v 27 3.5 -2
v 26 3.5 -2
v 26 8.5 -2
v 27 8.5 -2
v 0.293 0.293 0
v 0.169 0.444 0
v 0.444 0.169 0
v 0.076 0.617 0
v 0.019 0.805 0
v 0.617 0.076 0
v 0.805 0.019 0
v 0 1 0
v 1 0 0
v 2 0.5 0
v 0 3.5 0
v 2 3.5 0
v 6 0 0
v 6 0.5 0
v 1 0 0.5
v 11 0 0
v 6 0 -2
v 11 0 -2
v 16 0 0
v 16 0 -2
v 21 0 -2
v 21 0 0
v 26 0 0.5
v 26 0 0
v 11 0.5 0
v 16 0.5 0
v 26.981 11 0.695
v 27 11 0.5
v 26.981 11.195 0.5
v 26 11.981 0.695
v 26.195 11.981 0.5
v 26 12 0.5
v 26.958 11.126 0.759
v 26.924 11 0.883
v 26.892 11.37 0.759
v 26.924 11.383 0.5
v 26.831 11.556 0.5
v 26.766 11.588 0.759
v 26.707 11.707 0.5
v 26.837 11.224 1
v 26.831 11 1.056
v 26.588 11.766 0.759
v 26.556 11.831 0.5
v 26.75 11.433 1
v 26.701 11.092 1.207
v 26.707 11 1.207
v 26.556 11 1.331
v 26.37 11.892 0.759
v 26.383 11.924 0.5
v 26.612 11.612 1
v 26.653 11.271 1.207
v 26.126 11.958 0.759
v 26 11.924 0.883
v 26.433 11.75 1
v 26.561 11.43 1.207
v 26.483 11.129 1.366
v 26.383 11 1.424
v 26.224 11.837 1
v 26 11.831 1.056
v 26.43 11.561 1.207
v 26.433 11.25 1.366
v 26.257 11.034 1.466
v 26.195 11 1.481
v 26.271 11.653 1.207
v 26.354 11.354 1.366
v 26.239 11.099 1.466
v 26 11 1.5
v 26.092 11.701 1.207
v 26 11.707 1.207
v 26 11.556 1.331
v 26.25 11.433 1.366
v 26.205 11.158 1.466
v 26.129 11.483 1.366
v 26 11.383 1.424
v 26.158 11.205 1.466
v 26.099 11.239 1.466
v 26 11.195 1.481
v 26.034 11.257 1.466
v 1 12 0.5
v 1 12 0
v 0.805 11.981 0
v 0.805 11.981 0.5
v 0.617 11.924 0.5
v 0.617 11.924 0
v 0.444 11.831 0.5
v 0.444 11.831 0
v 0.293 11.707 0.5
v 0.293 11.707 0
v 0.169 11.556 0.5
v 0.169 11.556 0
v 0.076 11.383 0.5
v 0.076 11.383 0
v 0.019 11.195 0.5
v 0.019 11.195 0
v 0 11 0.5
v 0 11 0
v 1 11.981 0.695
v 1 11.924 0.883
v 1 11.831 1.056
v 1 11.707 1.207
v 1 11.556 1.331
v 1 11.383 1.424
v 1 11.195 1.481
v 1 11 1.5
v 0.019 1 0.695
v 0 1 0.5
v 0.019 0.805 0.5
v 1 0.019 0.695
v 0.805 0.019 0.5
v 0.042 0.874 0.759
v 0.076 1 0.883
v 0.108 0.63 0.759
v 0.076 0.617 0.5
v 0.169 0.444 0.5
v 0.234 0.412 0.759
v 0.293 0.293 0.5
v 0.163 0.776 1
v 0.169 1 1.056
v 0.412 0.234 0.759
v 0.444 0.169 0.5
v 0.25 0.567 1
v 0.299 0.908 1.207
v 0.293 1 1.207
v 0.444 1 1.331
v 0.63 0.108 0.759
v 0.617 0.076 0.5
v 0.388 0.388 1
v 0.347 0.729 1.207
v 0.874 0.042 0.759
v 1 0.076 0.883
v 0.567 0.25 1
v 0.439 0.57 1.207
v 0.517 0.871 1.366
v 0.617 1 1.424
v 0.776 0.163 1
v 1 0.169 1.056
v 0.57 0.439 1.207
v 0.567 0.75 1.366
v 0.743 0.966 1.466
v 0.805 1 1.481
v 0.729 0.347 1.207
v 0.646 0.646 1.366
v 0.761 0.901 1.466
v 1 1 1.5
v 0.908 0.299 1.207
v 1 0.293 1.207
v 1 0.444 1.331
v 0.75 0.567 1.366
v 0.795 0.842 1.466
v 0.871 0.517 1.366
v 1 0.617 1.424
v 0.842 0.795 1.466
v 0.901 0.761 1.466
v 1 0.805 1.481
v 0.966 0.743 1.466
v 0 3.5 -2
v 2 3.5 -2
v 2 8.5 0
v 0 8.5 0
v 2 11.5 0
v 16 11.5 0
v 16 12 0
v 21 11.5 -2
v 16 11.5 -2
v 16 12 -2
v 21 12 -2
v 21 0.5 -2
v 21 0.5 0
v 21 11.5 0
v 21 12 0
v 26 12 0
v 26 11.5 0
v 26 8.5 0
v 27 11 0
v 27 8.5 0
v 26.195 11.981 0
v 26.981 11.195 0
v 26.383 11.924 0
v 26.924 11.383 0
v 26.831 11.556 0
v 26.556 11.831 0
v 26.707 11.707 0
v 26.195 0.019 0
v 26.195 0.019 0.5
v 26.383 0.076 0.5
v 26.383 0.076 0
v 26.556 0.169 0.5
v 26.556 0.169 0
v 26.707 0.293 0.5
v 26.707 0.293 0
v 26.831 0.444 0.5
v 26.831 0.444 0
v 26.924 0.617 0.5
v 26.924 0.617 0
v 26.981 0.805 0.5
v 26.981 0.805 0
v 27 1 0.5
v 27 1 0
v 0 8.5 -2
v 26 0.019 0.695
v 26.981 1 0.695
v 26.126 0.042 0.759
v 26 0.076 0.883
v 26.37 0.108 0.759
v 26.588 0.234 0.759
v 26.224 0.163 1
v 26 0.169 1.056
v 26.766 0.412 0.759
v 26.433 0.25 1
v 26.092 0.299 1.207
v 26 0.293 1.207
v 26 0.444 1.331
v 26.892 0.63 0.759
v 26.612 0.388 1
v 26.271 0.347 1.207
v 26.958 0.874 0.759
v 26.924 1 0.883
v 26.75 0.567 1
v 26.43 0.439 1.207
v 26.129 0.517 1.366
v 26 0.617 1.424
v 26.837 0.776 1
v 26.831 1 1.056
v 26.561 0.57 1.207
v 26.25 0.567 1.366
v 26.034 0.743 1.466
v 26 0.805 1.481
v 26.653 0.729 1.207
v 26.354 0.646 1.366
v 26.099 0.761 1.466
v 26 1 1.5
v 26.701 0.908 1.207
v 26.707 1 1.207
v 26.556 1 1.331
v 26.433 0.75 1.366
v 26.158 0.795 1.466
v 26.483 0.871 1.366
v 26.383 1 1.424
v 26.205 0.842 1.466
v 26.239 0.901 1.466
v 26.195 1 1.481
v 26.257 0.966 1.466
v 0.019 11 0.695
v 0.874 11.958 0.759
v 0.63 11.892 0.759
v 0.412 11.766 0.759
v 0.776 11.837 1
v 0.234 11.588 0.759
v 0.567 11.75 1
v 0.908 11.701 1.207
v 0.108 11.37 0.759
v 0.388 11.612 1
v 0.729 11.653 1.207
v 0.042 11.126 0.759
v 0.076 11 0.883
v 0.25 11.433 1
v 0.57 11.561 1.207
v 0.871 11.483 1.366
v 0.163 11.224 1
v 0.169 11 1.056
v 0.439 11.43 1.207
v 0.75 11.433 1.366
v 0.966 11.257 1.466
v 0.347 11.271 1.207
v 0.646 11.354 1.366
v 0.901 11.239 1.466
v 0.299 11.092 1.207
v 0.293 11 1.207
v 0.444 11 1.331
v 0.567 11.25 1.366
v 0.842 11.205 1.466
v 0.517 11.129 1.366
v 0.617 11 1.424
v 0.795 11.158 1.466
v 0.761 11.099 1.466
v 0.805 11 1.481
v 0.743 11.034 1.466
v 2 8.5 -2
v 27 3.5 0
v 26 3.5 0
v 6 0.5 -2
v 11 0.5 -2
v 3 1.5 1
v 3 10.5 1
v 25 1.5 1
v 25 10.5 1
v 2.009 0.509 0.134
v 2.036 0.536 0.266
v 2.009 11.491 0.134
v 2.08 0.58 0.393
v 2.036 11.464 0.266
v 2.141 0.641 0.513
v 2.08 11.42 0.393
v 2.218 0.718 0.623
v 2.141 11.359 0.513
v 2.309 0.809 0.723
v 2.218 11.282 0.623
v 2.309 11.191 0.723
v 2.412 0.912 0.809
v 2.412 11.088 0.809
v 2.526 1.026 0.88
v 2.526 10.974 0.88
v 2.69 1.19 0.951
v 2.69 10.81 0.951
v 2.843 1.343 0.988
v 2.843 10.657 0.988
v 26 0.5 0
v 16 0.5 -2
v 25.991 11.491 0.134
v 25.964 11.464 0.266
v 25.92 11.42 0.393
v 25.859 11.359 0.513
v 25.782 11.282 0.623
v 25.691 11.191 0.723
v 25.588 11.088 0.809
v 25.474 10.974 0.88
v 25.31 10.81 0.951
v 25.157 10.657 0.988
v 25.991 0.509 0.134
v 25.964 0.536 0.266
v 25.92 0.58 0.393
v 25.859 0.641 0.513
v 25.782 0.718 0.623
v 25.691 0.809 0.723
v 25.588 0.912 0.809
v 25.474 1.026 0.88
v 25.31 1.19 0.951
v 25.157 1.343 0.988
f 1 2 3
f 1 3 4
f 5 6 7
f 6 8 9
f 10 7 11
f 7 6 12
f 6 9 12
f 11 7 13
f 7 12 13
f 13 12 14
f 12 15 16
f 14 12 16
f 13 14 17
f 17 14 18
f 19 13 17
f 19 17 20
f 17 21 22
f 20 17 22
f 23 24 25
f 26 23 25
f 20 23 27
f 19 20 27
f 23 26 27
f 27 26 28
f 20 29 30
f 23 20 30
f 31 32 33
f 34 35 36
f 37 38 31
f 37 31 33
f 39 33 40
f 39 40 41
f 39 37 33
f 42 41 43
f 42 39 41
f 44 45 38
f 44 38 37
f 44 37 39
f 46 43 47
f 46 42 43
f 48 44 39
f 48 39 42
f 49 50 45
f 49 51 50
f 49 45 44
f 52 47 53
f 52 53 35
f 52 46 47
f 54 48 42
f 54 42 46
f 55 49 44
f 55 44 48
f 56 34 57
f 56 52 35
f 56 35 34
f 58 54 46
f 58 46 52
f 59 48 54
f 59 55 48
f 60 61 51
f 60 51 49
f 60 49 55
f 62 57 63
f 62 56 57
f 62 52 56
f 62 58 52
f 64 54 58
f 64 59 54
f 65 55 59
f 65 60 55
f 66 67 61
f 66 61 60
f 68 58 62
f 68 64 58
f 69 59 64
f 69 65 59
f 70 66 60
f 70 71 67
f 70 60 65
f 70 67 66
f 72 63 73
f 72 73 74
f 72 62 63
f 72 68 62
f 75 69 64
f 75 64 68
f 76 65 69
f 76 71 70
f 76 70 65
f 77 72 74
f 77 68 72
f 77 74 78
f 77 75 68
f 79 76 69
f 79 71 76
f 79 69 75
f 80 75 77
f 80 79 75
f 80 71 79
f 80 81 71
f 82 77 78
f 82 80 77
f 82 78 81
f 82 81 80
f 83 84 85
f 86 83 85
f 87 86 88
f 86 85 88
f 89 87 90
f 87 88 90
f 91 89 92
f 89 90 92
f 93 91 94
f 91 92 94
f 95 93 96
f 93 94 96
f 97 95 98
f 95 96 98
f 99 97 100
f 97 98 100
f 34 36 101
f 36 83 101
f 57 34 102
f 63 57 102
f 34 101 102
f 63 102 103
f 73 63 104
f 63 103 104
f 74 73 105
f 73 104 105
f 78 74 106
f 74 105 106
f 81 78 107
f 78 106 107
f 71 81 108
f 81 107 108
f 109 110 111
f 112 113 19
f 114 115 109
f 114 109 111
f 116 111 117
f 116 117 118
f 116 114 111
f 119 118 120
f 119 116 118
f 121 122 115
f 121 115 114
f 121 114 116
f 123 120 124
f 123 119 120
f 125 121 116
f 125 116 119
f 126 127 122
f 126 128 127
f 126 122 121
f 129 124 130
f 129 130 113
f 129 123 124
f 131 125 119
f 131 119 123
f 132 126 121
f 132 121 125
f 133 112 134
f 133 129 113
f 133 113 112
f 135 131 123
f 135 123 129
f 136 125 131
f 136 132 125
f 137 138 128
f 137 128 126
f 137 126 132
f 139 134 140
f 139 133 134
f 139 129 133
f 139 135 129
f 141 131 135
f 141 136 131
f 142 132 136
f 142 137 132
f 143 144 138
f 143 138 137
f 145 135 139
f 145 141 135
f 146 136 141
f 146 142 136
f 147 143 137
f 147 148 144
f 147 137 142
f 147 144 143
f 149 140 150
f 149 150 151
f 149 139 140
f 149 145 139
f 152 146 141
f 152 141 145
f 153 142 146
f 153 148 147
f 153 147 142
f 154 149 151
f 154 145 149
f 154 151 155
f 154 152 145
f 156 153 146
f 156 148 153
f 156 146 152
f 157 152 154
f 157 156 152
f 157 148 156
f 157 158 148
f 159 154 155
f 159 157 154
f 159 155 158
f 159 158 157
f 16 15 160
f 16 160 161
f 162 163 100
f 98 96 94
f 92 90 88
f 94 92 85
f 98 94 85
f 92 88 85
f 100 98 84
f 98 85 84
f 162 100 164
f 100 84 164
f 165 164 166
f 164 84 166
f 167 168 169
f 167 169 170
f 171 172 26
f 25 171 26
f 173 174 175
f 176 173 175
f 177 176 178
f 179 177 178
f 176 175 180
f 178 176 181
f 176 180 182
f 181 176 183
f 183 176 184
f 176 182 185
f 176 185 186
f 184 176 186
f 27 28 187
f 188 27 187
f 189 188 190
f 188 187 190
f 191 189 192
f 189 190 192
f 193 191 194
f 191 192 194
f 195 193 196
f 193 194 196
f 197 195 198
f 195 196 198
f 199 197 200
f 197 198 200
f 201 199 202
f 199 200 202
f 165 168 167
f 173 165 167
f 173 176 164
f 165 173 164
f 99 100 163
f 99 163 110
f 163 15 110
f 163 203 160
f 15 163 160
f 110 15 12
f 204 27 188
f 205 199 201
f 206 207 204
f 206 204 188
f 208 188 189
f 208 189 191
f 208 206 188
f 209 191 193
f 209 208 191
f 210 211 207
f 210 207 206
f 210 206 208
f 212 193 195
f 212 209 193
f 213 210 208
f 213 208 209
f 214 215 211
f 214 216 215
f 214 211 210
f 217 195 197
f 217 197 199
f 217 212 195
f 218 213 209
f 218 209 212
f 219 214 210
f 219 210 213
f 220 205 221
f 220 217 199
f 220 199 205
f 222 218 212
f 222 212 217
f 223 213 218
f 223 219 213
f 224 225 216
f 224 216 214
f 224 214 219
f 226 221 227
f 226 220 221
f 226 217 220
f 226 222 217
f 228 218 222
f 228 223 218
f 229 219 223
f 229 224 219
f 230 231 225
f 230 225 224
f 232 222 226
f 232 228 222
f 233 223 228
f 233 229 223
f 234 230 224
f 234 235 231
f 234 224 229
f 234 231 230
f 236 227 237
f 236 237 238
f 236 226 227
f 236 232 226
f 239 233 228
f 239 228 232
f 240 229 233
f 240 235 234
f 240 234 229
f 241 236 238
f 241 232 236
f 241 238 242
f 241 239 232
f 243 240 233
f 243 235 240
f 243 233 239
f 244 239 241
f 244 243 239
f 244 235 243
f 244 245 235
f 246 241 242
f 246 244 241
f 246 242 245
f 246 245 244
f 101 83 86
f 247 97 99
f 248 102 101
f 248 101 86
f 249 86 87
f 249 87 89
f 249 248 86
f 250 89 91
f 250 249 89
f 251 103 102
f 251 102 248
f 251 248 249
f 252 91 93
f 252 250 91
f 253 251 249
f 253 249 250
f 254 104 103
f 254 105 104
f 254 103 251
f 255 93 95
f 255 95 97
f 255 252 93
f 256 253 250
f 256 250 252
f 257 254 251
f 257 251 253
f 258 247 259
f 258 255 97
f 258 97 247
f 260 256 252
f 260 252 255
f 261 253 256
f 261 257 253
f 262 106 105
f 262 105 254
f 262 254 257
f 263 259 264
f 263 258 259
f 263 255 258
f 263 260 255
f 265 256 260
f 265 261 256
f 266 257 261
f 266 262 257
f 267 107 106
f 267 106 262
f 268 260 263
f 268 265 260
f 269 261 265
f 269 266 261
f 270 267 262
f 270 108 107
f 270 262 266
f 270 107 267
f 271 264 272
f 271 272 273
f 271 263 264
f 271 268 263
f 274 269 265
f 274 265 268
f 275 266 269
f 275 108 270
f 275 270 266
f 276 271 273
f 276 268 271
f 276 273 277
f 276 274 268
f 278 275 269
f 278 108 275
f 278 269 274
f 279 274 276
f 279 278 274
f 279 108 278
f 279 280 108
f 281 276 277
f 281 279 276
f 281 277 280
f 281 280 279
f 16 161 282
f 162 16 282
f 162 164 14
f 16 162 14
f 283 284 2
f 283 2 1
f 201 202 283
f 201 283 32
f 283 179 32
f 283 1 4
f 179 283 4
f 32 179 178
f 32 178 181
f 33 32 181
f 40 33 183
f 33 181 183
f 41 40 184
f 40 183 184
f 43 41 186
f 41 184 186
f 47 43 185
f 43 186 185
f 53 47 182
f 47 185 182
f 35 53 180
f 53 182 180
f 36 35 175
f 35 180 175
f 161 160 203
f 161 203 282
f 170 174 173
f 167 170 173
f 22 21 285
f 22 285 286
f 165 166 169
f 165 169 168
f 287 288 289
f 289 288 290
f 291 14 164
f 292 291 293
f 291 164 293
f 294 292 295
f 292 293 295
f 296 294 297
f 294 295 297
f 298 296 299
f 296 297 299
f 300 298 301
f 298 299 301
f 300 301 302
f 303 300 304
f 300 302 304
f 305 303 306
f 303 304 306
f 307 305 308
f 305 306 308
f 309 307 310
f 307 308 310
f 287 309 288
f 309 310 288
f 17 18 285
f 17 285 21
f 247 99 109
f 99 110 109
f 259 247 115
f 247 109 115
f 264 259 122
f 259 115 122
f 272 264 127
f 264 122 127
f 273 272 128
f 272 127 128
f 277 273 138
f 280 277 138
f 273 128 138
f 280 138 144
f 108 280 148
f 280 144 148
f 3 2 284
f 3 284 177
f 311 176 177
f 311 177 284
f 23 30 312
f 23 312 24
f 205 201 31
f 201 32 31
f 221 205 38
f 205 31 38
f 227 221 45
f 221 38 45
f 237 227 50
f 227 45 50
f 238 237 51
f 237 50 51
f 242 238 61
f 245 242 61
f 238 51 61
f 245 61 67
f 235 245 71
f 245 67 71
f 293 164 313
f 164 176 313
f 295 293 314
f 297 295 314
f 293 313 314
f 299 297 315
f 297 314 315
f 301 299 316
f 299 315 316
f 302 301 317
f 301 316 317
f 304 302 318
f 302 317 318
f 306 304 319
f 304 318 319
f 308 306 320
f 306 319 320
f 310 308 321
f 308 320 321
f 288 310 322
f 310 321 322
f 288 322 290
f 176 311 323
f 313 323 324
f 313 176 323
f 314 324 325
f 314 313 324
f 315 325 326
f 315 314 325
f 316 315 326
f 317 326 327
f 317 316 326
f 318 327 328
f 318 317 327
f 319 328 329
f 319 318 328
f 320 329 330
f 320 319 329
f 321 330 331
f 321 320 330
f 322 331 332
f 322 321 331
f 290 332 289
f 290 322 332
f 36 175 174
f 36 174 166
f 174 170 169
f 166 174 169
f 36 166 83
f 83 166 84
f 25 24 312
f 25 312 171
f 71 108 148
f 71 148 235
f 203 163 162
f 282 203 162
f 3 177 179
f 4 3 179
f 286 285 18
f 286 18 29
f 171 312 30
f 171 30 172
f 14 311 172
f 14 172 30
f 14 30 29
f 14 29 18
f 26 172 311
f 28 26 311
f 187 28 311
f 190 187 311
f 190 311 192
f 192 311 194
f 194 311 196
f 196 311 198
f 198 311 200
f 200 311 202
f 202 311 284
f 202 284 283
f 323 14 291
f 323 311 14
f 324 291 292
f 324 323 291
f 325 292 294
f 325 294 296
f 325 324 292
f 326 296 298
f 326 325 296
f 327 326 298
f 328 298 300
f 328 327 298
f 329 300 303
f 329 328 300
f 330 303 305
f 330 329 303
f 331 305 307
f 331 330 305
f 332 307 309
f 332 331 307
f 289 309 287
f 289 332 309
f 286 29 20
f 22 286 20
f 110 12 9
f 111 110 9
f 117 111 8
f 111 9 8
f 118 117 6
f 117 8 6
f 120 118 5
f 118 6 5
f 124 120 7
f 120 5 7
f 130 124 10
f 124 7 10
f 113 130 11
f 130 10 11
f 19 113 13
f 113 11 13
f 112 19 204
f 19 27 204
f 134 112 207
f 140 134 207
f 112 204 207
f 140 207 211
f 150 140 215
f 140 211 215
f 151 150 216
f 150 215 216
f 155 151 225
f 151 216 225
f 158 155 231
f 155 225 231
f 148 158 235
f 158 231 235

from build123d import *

# Parameters (mm, degrees)
F1_DEPTH = 1.5
F2_R     = 1
F3_W     = 24
F3_H     = 11
F4_DEPTH = 1
F5_R     = 0.99999
F6_W     = 2
F6_H     = 5
F6_W_2   = 1
F6_W_3   = 5
F6_H_2   = 0.5
F7_DEPTH = 2


# Not quite as in the source:
# - a fillet or chamfer is up to 0.001 mm smaller than in the source, because OpenCascade refuses the exact size


with BuildPart() as f1:
    # F0 (on Top) → F1 (new body)
    with BuildSketch(Plane.XY):
        with BuildLine():
            ThreePointArc((0, 1), (0.2928932188, 0.2928932188), (1, 0))
            Line((1, 0), (26, 0))
            ThreePointArc((26, 0), (26.7071067812, 0.2928932188), (27, 1))
            Line((27, 1), (27, 11))
            ThreePointArc((27, 11), (26.7071067812, 11.7071067812), (26, 12))
            Line((26, 12), (1, 12))
            ThreePointArc((1, 12), (0.2928932188, 11.7071067812), (0, 11))
            Line((0, 11), (0, 1))
        make_face()
    extrude(amount=F1_DEPTH)

    # F2
    f2_edges = [f1.edges().sort_by_distance(p)[0] for p in [
        (0, 6, 1.5),
        (0.292893, 0.292893, 1.5),
        (13.5, 0, 1.5),
        (26.707107, 0.292893, 1.5),
        (27, 6, 1.5),
        (26.707107, 11.707107, 1.5),
        (13.5, 12, 1.5),
        (0.292893, 11.707107, 1.5),
    ]]
    fillet(f2_edges, radius=F2_R)

    # F3 (on Top) → F4 (cut)
    with BuildSketch(Plane.XY):
        with Locations((14, 6)):
            Rectangle(F3_W, F3_H)
    extrude(amount=F4_DEPTH, mode=Mode.SUBTRACT)

    # F5 (radius 1 in the source; OpenCascade refuses exactly that, so slightly less here)
    f5_edges = [f1.edges().sort_by_distance(p)[0] for p in [
        (14, 11.5, 1),
        (2, 6, 1),
        (14, 0.5, 1),
        (26, 6, 1),
    ]]
    fillet(f5_edges, radius=F5_R)

    # F6 (on face) → F7 (join)
    with BuildSketch(Plane(origin=(0, 0, 0), x_dir=(1, 0, 0), z_dir=(0, 0, -1))):
        with Locations((1, -6)):
            Rectangle(F6_W, F6_H)
        with Locations((26.5, -6)):
            Rectangle(F6_W_2, F6_H)
        with Locations((8.5, -0.25)):
            Rectangle(F6_W_3, F6_H_2)
        with Locations((18.5, -0.25)):
            Rectangle(F6_W_3, F6_H_2)
        with Locations((18.5, -11.75)):
            Rectangle(F6_W_3, F6_H_2)
    extrude(amount=F7_DEPTH)


solid = f1.part
